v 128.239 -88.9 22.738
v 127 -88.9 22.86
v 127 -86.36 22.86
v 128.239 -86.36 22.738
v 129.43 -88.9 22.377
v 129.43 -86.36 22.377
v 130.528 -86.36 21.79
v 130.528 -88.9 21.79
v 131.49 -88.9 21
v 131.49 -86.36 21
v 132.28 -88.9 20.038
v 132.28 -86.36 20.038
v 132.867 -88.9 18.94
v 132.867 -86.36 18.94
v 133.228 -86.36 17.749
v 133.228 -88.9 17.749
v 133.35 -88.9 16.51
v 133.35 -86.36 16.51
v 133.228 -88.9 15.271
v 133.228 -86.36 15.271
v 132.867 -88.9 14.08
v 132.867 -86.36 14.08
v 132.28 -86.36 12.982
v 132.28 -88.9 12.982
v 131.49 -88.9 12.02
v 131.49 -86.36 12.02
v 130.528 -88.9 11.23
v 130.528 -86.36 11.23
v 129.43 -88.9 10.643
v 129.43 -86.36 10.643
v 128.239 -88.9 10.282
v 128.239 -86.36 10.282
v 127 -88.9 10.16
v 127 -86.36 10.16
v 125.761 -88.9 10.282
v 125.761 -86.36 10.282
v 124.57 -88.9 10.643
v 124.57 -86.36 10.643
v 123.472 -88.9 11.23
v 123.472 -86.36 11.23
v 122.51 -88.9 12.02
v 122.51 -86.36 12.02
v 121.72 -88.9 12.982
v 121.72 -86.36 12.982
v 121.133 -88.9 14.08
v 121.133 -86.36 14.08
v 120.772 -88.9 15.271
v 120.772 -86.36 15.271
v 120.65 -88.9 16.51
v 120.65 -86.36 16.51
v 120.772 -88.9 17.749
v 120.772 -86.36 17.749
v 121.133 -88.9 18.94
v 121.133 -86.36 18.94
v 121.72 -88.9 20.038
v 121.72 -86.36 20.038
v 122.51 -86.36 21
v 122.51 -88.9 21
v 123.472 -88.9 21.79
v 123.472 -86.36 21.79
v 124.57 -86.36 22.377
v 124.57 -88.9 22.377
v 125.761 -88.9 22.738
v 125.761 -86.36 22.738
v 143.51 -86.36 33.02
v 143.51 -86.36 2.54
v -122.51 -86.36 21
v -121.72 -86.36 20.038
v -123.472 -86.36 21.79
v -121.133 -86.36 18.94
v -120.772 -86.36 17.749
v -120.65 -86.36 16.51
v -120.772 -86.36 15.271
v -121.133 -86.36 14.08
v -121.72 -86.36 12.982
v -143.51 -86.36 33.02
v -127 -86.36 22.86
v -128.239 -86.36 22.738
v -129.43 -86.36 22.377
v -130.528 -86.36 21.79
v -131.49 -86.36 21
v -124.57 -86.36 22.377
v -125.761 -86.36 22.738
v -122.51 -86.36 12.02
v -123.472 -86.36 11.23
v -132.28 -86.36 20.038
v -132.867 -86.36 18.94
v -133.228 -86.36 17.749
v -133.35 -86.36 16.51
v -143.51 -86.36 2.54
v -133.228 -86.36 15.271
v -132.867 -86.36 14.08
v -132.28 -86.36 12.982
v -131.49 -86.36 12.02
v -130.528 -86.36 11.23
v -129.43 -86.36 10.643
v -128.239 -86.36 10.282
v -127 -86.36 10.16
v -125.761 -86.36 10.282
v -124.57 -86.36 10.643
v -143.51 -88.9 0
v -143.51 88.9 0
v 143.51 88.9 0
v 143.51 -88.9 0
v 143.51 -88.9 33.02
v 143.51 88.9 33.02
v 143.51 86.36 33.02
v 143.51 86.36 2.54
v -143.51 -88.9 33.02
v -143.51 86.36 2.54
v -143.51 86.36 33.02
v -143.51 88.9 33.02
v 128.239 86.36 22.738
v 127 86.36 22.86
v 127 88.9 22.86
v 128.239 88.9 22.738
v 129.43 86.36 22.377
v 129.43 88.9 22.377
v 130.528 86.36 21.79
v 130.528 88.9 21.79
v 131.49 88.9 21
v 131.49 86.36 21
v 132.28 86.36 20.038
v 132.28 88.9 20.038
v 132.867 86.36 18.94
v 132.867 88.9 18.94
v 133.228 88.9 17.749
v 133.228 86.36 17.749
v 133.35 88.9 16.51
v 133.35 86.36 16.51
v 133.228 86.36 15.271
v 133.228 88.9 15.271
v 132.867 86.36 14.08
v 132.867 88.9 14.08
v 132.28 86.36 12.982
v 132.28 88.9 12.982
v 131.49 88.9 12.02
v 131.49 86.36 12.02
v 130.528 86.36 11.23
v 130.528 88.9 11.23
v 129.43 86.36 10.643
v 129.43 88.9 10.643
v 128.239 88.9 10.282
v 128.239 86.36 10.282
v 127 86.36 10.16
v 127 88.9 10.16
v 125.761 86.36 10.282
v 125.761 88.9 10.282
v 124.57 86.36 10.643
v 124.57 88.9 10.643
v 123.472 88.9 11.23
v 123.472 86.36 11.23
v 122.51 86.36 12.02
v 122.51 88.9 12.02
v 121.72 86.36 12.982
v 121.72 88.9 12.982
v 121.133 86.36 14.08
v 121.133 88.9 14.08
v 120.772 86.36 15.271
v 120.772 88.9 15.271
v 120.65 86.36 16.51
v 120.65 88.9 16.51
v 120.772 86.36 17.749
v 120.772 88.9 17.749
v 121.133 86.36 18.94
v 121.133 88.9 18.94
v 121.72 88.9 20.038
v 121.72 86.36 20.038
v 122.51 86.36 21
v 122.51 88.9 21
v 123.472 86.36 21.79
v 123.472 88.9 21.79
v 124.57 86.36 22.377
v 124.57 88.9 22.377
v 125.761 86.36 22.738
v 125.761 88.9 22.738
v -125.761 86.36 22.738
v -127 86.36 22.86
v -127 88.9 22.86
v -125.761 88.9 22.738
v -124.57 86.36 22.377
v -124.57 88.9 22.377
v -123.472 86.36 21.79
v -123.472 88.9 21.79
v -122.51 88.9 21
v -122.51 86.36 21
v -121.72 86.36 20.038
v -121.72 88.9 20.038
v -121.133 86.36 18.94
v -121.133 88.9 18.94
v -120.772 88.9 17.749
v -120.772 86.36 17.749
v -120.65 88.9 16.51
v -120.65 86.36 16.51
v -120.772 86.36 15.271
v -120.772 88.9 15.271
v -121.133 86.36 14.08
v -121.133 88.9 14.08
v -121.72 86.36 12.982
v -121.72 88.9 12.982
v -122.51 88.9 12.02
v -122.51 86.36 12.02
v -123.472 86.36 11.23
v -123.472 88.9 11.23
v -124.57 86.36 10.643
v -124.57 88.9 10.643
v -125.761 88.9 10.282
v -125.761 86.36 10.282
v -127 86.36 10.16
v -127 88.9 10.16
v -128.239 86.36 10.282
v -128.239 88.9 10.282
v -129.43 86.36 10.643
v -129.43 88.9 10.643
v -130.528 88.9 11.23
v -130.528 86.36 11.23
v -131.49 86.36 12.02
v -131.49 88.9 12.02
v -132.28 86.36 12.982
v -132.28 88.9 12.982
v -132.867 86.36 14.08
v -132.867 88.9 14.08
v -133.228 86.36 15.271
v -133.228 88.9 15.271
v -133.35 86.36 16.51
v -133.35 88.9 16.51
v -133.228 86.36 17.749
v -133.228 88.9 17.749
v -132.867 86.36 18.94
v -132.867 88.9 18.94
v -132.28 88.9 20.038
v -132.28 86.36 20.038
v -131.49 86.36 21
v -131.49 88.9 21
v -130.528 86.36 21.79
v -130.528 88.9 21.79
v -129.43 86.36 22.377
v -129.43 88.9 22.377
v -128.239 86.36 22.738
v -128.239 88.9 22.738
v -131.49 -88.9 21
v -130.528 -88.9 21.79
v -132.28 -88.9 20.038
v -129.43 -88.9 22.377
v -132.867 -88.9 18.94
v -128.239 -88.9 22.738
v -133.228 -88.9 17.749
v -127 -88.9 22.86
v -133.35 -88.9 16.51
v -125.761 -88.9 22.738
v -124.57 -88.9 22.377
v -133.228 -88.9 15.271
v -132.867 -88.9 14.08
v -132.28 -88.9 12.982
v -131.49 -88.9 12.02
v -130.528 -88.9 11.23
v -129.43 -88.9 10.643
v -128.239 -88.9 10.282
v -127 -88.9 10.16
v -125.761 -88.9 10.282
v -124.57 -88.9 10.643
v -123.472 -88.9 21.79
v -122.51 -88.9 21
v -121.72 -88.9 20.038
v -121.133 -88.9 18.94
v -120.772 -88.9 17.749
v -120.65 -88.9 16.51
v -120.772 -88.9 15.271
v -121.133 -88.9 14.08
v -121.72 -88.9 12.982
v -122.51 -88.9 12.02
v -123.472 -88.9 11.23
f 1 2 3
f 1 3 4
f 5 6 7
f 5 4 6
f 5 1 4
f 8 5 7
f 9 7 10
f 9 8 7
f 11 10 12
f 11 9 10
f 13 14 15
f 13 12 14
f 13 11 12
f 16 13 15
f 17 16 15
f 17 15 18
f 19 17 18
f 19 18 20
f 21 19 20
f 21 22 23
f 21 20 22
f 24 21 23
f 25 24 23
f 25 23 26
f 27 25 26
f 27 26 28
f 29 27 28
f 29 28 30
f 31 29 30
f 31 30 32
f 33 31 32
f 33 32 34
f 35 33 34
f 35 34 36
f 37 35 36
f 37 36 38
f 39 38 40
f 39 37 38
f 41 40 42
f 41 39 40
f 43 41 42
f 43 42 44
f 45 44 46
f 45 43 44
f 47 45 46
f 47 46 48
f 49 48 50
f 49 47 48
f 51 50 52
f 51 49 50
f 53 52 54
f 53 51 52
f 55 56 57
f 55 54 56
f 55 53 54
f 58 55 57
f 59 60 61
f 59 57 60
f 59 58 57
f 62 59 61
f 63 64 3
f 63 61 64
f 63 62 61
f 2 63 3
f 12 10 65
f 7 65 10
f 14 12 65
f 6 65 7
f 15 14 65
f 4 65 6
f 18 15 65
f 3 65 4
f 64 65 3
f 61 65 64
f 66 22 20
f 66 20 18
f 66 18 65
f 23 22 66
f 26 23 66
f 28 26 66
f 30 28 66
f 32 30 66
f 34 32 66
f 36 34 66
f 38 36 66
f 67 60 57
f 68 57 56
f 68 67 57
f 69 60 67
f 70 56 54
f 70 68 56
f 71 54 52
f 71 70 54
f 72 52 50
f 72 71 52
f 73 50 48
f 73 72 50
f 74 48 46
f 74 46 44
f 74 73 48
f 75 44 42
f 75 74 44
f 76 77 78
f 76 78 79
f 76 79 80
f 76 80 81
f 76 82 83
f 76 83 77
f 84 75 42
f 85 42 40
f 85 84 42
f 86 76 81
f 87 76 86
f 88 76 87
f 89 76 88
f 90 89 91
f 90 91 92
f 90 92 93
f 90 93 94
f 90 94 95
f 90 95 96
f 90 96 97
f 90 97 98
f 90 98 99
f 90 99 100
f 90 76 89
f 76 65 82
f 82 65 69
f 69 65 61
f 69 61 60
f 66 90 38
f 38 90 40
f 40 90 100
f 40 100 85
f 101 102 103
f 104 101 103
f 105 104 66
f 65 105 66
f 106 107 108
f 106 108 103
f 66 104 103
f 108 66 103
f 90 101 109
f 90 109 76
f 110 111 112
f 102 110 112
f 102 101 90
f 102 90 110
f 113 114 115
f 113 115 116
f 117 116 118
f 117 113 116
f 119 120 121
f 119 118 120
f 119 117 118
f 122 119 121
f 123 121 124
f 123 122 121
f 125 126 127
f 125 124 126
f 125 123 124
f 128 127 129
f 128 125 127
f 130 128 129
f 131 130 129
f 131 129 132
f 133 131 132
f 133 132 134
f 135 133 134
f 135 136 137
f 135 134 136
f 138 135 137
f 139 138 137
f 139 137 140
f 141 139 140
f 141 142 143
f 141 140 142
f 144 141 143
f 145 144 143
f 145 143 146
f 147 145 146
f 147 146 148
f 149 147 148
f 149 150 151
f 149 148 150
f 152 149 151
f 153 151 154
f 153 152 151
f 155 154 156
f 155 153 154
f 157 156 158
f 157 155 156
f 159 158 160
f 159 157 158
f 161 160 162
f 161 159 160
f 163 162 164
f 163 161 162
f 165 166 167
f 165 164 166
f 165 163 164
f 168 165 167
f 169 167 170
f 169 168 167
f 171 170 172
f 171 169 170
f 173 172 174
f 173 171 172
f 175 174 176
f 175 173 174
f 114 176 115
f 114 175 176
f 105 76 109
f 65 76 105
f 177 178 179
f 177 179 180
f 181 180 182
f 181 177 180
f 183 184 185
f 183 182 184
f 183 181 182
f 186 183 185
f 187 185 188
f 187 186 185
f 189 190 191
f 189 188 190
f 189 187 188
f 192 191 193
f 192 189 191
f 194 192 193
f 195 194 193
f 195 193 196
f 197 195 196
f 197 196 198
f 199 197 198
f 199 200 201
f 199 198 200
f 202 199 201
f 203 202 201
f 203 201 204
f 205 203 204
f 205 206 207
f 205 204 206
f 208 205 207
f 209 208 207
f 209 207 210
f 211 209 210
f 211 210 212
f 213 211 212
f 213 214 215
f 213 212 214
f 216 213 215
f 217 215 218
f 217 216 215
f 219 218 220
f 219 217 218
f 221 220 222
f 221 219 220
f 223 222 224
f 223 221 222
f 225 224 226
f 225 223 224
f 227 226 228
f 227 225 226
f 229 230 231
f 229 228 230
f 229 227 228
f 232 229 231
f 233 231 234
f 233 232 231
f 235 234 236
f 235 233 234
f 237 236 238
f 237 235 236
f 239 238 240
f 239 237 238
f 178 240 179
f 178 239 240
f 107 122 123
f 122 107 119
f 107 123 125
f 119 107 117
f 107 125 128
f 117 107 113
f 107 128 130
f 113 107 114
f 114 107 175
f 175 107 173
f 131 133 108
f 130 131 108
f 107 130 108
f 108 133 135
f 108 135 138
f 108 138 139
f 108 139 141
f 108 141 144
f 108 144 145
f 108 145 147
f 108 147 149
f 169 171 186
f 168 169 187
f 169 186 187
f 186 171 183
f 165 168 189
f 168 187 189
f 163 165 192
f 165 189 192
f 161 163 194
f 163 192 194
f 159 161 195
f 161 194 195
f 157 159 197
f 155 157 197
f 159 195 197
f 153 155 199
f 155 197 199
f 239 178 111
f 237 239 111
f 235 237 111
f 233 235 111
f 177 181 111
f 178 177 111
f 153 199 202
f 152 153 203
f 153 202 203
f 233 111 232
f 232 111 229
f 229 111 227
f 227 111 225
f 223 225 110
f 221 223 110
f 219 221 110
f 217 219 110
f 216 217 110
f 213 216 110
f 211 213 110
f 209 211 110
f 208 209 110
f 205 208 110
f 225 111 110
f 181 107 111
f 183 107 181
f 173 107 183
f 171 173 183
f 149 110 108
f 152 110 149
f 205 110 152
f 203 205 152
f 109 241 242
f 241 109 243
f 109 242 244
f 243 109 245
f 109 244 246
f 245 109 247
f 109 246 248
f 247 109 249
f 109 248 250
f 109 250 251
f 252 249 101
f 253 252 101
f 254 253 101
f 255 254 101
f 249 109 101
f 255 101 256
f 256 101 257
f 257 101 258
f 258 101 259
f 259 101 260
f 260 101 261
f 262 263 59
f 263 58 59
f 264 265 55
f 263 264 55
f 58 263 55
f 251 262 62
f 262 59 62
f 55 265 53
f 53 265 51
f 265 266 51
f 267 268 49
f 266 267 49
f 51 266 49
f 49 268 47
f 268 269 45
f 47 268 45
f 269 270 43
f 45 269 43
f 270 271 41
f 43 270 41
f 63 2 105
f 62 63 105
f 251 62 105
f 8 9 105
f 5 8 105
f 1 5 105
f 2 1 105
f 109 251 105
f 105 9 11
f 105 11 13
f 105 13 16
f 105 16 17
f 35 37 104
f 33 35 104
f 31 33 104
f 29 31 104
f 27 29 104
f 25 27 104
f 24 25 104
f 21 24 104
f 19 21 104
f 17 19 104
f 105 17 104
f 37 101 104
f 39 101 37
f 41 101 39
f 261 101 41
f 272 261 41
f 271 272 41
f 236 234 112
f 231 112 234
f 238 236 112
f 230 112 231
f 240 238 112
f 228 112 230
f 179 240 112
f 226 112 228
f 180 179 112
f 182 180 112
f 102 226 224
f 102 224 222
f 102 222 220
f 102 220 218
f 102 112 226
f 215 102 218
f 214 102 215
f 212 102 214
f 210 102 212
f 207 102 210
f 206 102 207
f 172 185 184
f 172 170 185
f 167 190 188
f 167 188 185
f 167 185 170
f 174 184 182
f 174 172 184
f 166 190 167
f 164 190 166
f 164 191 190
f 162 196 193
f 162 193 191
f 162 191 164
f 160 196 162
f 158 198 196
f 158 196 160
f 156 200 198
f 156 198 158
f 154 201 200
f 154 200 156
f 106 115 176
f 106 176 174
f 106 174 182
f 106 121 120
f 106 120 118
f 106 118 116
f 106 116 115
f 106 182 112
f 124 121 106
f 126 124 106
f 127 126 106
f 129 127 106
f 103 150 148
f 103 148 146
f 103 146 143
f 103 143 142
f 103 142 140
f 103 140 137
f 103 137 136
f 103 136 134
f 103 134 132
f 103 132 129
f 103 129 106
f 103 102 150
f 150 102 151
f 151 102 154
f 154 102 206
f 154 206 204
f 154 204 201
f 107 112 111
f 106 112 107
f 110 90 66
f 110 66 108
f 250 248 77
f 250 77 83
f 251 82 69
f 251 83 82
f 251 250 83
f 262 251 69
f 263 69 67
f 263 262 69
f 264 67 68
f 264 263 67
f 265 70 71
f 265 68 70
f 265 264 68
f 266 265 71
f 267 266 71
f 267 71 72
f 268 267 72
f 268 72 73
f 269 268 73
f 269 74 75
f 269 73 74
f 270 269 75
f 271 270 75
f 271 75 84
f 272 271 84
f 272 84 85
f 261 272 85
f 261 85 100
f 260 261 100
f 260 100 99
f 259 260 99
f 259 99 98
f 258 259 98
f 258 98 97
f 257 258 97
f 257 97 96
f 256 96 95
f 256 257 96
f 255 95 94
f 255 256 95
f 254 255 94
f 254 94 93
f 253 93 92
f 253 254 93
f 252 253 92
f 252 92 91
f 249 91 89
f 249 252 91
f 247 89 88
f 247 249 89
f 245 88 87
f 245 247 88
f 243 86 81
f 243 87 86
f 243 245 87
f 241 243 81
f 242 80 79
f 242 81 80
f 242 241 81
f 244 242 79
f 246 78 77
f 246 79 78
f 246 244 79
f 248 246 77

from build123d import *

# Parameters (mm, degrees)
SKETCH3_W               = 287.02
SKETCH3_H               = 177.8
BOSS_EXTRUDE1_DEPTH     = 33.02
SKETCH4_W               = 281.94
SKETCH4_H               = 172.72
CUT_EXTRUDE1_DEPTH      = 30.48
CUT_EXTRUDE2_DEPTH      = 300.87064011
CUT_EXTRUDE2_DEPTH_BACK = 300.87064011
SKETCH5_W               = 30.48
SKETCH5_H               = 172.72
CUT_EXTRUDE3_DEPTH      = 229.913756904
CUT_EXTRUDE3_DEPTH_BACK = 229.913756904
SKETCH6_R               = 6.35


with BuildPart() as part:
    # Sketch3 → Boss-Extrude1 (new body)
    with BuildSketch(Plane.XY):
        Rectangle(SKETCH3_W, SKETCH3_H)
    extrude(amount=BOSS_EXTRUDE1_DEPTH)

    # Sketch4 → Cut-Extrude1 (cut)
    with BuildSketch(Plane.XY.offset(33.02)):
        Rectangle(SKETCH4_W, SKETCH4_H)
    extrude(amount=-CUT_EXTRUDE1_DEPTH, mode=Mode.SUBTRACT)

    # Sketch5 → Cut-Extrude2 (cut, two sides: drawn at the far end of the back side and taken through both)
    with BuildSketch(Plane(origin=(-140.97, 0, 0), x_dir=(0, 0, -1), z_dir=(1, 0, 0)).offset(-CUT_EXTRUDE2_DEPTH_BACK)):
        with Locations((-17.78, 0)):
            Rectangle(SKETCH5_W, SKETCH5_H)
    extrude(amount=CUT_EXTRUDE2_DEPTH + CUT_EXTRUDE2_DEPTH_BACK, mode=Mode.SUBTRACT)

    # Sketch6 → Cut-Extrude3 (cut, two sides: drawn at the far end of the back side and taken through both)
    with BuildSketch(Plane(origin=(0, -86.36, 0), x_dir=(1, 0, 0), z_dir=(0, 1, 0)).offset(-CUT_EXTRUDE3_DEPTH_BACK)):
        with Locations(Location((127, -16.51, 0), (0, 0, 270))):
            Circle(SKETCH6_R)
        with Locations(Location((-127, -16.51, 0), (0, 0, 270))):
            Circle(SKETCH6_R)
    extrude(amount=CUT_EXTRUDE3_DEPTH + CUT_EXTRUDE3_DEPTH_BACK, mode=Mode.SUBTRACT)


solid = part.part
